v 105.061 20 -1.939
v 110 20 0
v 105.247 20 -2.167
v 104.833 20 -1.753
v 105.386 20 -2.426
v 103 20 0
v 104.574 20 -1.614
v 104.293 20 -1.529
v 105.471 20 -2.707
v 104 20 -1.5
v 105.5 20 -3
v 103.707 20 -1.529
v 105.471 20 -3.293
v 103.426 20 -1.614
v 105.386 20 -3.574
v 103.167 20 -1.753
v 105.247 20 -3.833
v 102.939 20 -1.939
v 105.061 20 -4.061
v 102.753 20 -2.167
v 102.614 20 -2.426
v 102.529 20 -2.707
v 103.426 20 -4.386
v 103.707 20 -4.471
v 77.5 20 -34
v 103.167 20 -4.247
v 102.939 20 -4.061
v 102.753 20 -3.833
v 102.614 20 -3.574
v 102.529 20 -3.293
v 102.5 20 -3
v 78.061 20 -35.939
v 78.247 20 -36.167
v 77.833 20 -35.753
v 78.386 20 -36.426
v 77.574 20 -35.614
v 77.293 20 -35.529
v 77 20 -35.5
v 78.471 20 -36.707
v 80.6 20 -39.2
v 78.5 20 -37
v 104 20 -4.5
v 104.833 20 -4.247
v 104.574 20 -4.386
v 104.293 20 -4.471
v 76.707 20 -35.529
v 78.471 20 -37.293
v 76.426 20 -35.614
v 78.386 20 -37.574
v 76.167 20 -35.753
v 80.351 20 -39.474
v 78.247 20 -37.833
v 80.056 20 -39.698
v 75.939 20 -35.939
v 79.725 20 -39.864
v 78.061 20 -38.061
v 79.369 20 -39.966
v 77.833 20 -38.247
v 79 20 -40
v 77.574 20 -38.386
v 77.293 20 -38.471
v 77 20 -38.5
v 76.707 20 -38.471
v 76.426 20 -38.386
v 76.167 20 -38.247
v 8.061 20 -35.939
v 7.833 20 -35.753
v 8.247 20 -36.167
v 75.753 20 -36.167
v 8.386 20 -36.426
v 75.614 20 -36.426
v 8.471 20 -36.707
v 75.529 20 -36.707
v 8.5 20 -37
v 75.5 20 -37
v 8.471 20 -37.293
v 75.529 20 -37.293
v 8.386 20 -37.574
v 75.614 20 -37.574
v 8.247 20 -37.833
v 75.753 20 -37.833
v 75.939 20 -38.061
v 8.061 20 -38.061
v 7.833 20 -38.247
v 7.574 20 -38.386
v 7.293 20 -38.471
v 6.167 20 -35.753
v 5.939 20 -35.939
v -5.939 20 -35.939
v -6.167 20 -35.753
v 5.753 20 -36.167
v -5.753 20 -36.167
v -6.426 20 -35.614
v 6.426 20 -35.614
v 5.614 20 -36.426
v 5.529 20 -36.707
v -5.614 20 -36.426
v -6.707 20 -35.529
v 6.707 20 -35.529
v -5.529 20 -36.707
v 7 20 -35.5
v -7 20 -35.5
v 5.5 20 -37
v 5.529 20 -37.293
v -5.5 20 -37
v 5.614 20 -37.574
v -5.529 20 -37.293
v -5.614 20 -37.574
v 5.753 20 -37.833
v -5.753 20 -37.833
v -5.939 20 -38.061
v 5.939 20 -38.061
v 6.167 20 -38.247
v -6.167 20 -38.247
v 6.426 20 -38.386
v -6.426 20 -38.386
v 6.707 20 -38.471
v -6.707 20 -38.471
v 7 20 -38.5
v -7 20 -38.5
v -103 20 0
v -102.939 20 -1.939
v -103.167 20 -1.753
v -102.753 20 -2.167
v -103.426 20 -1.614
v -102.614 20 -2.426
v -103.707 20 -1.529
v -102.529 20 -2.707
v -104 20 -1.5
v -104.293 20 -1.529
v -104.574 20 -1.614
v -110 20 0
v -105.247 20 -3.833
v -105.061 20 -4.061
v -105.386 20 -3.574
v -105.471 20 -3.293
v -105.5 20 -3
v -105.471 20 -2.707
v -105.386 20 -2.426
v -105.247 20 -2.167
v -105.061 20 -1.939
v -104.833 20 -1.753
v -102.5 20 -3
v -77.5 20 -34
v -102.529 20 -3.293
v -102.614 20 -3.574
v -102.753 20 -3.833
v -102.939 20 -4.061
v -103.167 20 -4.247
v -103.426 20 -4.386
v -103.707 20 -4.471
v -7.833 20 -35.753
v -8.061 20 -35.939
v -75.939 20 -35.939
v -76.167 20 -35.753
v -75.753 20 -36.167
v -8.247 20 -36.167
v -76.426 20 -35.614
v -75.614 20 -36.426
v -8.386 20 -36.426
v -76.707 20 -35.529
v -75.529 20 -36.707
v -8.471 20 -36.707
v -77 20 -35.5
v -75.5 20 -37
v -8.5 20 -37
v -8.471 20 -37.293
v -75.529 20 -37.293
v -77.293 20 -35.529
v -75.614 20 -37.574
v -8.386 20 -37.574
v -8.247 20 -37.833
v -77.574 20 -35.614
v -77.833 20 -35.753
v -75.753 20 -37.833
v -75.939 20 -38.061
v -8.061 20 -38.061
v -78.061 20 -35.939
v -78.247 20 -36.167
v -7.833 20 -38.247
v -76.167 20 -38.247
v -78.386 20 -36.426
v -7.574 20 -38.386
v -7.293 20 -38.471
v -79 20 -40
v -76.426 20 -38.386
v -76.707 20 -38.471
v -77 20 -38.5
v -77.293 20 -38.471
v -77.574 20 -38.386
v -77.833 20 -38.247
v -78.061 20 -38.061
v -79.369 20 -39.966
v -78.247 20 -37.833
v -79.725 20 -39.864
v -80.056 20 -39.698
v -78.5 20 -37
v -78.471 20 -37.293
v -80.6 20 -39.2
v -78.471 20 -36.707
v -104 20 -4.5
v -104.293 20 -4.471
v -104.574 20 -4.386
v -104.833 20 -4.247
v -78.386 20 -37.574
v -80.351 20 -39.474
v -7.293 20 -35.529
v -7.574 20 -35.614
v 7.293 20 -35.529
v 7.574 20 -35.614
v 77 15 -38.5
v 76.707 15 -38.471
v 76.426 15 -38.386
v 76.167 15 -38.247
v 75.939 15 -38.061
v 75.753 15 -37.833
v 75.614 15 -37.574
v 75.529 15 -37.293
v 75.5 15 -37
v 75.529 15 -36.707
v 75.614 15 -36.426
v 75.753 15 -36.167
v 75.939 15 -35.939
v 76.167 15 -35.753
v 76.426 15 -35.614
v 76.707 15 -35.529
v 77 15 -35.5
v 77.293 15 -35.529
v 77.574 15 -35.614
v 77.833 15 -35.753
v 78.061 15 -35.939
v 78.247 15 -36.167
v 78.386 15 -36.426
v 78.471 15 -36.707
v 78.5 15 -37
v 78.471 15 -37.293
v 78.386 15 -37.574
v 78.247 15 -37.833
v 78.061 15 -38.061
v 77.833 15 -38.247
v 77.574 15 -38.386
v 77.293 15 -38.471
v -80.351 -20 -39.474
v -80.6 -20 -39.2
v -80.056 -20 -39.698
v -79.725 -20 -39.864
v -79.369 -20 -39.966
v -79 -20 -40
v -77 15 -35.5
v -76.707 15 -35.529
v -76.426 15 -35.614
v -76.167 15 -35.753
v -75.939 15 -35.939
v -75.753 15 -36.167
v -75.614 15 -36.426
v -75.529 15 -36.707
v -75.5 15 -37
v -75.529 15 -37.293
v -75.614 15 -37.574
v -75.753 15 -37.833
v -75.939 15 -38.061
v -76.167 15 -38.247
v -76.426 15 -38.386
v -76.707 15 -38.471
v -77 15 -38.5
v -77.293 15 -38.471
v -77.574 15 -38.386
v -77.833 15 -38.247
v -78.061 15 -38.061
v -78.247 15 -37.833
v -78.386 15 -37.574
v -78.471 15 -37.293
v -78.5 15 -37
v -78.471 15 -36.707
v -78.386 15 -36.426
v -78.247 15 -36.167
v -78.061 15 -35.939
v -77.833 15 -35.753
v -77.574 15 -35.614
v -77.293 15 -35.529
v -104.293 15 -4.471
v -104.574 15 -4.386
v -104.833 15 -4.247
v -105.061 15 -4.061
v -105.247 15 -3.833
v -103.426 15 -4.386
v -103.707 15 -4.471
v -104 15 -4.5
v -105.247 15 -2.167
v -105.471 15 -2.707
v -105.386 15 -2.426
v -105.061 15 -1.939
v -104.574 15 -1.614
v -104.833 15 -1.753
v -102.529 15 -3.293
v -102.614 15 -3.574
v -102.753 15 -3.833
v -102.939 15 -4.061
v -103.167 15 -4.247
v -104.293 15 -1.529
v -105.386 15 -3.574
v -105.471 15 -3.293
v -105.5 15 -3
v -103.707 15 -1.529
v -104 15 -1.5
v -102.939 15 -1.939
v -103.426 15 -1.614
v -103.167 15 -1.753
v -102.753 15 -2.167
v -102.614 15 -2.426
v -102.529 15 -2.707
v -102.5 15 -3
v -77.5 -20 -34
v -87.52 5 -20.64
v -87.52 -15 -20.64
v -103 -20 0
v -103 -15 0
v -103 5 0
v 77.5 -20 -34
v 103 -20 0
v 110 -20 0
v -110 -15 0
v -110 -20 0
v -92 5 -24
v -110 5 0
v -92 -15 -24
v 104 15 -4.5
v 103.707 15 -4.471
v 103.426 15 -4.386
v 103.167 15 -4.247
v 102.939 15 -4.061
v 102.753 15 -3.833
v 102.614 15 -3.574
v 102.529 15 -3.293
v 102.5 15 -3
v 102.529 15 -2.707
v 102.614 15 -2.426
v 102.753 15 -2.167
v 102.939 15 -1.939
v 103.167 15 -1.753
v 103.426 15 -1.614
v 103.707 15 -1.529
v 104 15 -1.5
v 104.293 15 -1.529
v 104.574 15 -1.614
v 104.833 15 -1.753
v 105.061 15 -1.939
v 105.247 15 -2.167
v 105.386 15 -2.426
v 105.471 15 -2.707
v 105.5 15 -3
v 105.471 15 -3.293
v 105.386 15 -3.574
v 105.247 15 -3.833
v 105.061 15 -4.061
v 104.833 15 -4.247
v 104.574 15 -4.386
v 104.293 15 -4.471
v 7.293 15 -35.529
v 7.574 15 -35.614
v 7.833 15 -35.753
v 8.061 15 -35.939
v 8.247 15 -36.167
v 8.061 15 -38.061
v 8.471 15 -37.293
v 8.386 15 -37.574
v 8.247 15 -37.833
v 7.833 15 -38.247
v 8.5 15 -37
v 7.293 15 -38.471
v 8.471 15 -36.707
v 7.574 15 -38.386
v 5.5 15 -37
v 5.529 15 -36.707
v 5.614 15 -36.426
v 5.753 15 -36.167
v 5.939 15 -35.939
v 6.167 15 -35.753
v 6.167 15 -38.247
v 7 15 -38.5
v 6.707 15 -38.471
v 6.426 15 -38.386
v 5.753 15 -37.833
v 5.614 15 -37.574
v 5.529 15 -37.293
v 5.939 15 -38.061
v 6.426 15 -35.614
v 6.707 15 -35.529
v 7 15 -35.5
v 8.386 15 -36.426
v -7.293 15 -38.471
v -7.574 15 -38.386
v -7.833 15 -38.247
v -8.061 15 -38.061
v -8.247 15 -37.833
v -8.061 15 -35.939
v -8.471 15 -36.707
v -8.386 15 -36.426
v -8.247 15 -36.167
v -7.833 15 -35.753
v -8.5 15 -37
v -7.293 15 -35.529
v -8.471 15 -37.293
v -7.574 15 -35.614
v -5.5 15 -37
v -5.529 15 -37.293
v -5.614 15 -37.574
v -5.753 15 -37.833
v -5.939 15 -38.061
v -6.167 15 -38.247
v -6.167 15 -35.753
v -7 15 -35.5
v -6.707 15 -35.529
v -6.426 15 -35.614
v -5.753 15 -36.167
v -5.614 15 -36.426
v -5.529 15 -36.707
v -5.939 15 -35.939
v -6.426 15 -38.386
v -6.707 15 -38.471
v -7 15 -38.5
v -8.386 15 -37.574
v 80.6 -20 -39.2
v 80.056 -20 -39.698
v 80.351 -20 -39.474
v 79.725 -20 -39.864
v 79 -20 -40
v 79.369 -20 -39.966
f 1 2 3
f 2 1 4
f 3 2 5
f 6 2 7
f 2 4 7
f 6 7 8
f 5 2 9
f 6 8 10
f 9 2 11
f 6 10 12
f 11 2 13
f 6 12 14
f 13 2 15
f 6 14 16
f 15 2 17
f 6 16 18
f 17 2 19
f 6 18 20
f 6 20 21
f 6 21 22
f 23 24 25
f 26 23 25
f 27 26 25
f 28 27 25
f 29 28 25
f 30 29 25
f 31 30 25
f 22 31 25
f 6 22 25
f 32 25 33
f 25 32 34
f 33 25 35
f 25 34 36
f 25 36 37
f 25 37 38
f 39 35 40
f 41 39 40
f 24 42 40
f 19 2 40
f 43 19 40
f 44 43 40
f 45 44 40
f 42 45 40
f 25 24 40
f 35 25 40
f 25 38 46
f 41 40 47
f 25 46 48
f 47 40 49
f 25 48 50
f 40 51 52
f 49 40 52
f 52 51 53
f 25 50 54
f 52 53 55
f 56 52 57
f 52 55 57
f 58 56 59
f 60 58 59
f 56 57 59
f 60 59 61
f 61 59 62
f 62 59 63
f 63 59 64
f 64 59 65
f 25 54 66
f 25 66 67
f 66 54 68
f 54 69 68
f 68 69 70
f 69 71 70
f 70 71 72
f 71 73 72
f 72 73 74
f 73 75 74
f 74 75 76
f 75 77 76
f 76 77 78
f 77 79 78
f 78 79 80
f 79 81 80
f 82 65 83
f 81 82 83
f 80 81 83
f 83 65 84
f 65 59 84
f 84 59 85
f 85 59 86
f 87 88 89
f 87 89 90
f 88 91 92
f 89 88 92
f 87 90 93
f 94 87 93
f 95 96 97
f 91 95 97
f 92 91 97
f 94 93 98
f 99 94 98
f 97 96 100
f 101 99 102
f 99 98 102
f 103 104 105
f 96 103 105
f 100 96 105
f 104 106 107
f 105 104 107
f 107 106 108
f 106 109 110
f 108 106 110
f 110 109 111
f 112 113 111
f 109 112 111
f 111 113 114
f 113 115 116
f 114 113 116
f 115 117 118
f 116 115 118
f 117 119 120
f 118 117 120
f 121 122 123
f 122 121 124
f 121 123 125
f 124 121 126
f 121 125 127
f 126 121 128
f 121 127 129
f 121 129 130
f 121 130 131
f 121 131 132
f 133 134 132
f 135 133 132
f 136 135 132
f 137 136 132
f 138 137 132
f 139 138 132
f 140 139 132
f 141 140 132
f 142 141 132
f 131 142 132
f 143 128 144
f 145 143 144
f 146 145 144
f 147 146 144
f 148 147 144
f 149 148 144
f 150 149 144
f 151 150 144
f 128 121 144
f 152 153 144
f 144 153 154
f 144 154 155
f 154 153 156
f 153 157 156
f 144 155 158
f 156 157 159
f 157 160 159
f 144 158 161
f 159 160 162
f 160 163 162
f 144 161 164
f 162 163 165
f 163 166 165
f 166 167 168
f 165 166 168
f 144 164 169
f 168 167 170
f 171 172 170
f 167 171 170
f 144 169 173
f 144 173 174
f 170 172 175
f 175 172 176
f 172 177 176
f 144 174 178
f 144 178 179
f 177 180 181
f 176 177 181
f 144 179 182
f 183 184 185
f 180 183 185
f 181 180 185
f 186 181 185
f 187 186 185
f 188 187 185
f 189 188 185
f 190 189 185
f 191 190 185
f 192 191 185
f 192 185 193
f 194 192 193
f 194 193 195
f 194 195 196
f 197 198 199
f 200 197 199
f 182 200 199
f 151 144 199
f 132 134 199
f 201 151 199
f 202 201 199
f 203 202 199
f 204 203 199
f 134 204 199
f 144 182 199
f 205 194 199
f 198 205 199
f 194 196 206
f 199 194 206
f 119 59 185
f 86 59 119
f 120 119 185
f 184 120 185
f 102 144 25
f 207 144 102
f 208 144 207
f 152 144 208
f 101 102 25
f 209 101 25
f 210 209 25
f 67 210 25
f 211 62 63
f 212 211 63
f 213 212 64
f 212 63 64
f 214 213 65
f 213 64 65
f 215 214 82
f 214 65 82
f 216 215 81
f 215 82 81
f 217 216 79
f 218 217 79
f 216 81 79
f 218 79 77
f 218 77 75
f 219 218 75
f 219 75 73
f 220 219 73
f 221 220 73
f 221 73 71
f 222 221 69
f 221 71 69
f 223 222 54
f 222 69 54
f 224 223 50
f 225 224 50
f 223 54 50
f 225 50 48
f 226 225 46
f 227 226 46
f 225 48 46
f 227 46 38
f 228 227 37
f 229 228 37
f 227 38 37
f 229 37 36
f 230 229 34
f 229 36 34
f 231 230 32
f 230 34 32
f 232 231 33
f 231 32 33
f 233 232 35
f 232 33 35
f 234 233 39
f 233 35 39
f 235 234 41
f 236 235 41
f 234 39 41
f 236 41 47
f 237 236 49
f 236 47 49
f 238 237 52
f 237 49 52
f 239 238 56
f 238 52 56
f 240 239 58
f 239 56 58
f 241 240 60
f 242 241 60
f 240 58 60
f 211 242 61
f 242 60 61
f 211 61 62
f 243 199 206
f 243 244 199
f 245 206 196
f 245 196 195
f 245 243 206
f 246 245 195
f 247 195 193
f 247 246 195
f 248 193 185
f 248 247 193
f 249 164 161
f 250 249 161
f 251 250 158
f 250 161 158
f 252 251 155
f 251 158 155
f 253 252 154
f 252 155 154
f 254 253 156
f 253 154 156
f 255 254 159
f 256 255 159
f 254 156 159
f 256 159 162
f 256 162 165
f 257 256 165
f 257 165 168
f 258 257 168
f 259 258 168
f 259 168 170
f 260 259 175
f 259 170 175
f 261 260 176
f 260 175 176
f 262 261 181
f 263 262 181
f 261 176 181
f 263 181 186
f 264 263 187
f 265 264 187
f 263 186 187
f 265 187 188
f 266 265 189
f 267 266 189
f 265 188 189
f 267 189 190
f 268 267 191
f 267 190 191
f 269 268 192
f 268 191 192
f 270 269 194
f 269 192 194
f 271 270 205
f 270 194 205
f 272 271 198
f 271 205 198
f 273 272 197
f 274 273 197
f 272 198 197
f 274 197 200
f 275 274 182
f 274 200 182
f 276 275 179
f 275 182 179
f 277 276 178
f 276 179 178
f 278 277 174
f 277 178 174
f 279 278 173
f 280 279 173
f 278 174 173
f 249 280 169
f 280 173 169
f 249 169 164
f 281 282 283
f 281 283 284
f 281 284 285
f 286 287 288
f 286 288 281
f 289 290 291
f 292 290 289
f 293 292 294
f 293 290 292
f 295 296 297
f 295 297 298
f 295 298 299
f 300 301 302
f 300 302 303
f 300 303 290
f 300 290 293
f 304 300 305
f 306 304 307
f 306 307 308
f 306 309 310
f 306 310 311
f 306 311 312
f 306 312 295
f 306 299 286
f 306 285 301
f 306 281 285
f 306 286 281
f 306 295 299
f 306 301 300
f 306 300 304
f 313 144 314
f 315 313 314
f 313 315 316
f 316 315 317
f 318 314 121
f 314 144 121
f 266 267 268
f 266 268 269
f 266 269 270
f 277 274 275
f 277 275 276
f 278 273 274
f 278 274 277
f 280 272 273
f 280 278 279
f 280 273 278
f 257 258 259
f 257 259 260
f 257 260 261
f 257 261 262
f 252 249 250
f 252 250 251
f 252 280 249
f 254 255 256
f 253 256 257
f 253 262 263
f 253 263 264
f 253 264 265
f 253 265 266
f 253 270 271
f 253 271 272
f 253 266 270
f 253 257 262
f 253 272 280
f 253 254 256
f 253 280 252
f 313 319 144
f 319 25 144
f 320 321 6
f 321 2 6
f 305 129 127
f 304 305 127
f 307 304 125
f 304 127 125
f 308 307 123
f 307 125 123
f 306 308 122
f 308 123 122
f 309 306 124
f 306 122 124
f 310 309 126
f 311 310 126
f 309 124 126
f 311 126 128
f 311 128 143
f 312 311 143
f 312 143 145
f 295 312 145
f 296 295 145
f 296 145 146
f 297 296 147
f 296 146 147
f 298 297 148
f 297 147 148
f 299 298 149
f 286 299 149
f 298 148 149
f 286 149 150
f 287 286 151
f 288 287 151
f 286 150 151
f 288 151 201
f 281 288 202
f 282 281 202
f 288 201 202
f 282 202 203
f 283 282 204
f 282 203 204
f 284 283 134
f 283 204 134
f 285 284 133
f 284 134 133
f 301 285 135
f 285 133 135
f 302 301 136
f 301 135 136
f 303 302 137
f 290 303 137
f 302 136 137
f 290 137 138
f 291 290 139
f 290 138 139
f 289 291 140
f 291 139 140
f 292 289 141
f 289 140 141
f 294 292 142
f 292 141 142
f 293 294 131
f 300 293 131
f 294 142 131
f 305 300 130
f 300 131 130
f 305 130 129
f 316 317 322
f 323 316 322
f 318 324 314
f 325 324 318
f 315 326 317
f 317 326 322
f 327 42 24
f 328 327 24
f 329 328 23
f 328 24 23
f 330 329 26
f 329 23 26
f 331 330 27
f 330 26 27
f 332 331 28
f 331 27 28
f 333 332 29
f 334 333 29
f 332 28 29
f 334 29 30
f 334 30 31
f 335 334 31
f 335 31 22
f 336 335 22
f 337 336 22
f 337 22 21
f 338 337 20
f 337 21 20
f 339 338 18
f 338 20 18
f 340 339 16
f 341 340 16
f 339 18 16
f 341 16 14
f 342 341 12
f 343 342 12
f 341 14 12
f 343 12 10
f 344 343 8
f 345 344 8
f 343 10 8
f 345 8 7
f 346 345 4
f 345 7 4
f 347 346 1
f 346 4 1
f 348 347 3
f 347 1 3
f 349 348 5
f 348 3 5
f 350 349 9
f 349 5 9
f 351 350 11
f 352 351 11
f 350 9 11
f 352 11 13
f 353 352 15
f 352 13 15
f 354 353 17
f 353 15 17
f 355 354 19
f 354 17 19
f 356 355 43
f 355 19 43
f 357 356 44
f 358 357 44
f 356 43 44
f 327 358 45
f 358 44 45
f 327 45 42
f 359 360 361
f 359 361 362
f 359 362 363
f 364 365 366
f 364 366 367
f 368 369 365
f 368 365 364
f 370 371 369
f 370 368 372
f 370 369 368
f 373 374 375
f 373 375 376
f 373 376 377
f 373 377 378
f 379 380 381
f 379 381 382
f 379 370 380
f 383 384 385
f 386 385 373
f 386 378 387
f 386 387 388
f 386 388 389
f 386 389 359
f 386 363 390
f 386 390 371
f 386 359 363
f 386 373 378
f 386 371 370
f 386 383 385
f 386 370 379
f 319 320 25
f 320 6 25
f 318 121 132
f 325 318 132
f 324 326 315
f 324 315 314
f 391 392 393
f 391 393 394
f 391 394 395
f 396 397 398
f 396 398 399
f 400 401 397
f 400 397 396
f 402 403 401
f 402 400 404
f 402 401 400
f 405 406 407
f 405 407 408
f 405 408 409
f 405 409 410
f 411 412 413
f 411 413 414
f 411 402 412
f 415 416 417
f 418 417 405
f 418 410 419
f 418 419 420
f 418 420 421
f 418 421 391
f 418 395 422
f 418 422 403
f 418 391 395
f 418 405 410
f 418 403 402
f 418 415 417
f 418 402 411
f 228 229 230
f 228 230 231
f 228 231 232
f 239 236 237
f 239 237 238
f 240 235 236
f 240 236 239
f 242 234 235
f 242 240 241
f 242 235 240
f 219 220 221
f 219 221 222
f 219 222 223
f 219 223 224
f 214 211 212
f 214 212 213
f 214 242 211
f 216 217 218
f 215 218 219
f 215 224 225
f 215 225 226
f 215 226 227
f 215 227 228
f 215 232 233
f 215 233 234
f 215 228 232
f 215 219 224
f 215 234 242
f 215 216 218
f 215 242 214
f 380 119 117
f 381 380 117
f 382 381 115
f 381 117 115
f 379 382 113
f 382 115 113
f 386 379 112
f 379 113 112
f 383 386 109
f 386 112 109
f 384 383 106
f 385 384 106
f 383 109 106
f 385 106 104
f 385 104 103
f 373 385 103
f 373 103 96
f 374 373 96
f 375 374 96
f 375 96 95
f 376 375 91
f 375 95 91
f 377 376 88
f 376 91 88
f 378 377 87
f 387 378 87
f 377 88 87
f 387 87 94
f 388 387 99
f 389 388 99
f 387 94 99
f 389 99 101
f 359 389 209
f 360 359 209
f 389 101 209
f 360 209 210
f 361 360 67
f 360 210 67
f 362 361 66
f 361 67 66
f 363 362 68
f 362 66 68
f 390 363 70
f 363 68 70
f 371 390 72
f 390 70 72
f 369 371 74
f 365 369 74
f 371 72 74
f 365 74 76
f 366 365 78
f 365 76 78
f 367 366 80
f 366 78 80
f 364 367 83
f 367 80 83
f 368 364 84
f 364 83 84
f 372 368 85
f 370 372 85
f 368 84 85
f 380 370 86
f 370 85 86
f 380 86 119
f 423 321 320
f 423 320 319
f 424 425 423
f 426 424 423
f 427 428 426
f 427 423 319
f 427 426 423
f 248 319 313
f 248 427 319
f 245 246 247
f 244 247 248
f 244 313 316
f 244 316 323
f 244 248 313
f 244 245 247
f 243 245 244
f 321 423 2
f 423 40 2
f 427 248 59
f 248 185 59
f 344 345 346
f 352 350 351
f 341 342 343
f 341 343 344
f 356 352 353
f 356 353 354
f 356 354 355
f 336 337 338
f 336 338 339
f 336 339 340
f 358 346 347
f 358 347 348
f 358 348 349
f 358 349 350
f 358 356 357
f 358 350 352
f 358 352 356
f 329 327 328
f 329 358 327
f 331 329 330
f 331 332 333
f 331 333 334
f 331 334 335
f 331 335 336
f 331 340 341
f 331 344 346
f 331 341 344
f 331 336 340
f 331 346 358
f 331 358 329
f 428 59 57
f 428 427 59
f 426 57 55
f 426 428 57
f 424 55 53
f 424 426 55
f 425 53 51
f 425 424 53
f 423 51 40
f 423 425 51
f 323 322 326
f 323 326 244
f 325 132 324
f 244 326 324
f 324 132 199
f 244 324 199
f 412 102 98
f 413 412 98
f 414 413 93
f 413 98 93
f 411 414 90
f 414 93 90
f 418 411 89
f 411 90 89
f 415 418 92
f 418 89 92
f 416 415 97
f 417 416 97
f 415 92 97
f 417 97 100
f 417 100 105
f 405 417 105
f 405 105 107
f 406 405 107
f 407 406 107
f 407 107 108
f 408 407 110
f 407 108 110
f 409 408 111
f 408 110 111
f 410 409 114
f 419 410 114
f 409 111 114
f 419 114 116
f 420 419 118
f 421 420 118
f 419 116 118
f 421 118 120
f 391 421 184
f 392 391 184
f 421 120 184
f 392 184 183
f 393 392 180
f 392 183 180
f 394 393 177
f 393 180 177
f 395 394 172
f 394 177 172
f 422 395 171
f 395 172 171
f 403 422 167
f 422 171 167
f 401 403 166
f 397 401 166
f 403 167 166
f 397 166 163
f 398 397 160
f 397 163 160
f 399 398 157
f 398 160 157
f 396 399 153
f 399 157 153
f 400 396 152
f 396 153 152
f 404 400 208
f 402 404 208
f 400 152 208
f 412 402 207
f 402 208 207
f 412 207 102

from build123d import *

# Parameters (mm, degrees)
BOSS_EXTRUDE1_DEPTH = 20
SKETCH2_R           = 1.5
CUT_EXTRUDE1_DEPTH  = 5
FILLET1_R           = 2
SKETCH3_W           = 30
SKETCH3_H           = 20
CUT_EXTRUDE2_DEPTH  = 10


with BuildPart() as part:
    # Sketch1 → Boss-Extrude1 (new, symmetric)
    with BuildSketch(Plane(origin=(0, 0, 0), x_dir=(1, 0, 0), z_dir=(0, 1, 0))):
        Polygon((-110, 0), (-80, 40), (80, 40), (110, 0), (103, 0), (77.5, 34), (-77.5, 34), (-103, 0), align=None)
    extrude(amount=BOSS_EXTRUDE1_DEPTH, both=True)

    # Sketch2 → Cut-Extrude1 (cut)
    with BuildSketch(Plane(origin=(0, 20, 0), x_dir=(1, 0, 0), z_dir=(0, 1, 0))):
        with Locations(Location((-104, 3, 0), (0, 0, 270))):
            Circle(SKETCH2_R)
        with Locations(Location((-77, 37, 0), (0, 0, 270))):
            Circle(SKETCH2_R)
        with Locations(Location((-7, 37, 0), (0, 0, 270))):
            Circle(SKETCH2_R)
        with Locations(Location((7, 37, 0), (0, 0, 90))):
            Circle(SKETCH2_R)
        with Locations(Location((77, 37, 0), (0, 0, 90))):
            Circle(SKETCH2_R)
        with Locations(Location((104, 3, 0), (0, 0, 90))):
            Circle(SKETCH2_R)
    extrude(amount=-CUT_EXTRUDE1_DEPTH, mode=Mode.SUBTRACT)

    # Fillet1
    fillet1_edges = [part.edges().sort_by_distance(p)[0] for p in [
        (-80, 0, -40),
        (80, 0, -40),
    ]]
    fillet(fillet1_edges, radius=FILLET1_R)

    # Sketch3 → Cut-Extrude2 (cut)
    with BuildSketch(Plane(origin=(-70.4, 0, -52.8), x_dir=(-0.5999999999999998, 0, 0.8000000000000003), z_dir=(-0.8000000000000004, 0, -0.5999999999999998))):
        with Locations((51, -5)):
            Rectangle(SKETCH3_W, SKETCH3_H)
    extrude(amount=-CUT_EXTRUDE2_DEPTH, mode=Mode.SUBTRACT)


solid = part.part
